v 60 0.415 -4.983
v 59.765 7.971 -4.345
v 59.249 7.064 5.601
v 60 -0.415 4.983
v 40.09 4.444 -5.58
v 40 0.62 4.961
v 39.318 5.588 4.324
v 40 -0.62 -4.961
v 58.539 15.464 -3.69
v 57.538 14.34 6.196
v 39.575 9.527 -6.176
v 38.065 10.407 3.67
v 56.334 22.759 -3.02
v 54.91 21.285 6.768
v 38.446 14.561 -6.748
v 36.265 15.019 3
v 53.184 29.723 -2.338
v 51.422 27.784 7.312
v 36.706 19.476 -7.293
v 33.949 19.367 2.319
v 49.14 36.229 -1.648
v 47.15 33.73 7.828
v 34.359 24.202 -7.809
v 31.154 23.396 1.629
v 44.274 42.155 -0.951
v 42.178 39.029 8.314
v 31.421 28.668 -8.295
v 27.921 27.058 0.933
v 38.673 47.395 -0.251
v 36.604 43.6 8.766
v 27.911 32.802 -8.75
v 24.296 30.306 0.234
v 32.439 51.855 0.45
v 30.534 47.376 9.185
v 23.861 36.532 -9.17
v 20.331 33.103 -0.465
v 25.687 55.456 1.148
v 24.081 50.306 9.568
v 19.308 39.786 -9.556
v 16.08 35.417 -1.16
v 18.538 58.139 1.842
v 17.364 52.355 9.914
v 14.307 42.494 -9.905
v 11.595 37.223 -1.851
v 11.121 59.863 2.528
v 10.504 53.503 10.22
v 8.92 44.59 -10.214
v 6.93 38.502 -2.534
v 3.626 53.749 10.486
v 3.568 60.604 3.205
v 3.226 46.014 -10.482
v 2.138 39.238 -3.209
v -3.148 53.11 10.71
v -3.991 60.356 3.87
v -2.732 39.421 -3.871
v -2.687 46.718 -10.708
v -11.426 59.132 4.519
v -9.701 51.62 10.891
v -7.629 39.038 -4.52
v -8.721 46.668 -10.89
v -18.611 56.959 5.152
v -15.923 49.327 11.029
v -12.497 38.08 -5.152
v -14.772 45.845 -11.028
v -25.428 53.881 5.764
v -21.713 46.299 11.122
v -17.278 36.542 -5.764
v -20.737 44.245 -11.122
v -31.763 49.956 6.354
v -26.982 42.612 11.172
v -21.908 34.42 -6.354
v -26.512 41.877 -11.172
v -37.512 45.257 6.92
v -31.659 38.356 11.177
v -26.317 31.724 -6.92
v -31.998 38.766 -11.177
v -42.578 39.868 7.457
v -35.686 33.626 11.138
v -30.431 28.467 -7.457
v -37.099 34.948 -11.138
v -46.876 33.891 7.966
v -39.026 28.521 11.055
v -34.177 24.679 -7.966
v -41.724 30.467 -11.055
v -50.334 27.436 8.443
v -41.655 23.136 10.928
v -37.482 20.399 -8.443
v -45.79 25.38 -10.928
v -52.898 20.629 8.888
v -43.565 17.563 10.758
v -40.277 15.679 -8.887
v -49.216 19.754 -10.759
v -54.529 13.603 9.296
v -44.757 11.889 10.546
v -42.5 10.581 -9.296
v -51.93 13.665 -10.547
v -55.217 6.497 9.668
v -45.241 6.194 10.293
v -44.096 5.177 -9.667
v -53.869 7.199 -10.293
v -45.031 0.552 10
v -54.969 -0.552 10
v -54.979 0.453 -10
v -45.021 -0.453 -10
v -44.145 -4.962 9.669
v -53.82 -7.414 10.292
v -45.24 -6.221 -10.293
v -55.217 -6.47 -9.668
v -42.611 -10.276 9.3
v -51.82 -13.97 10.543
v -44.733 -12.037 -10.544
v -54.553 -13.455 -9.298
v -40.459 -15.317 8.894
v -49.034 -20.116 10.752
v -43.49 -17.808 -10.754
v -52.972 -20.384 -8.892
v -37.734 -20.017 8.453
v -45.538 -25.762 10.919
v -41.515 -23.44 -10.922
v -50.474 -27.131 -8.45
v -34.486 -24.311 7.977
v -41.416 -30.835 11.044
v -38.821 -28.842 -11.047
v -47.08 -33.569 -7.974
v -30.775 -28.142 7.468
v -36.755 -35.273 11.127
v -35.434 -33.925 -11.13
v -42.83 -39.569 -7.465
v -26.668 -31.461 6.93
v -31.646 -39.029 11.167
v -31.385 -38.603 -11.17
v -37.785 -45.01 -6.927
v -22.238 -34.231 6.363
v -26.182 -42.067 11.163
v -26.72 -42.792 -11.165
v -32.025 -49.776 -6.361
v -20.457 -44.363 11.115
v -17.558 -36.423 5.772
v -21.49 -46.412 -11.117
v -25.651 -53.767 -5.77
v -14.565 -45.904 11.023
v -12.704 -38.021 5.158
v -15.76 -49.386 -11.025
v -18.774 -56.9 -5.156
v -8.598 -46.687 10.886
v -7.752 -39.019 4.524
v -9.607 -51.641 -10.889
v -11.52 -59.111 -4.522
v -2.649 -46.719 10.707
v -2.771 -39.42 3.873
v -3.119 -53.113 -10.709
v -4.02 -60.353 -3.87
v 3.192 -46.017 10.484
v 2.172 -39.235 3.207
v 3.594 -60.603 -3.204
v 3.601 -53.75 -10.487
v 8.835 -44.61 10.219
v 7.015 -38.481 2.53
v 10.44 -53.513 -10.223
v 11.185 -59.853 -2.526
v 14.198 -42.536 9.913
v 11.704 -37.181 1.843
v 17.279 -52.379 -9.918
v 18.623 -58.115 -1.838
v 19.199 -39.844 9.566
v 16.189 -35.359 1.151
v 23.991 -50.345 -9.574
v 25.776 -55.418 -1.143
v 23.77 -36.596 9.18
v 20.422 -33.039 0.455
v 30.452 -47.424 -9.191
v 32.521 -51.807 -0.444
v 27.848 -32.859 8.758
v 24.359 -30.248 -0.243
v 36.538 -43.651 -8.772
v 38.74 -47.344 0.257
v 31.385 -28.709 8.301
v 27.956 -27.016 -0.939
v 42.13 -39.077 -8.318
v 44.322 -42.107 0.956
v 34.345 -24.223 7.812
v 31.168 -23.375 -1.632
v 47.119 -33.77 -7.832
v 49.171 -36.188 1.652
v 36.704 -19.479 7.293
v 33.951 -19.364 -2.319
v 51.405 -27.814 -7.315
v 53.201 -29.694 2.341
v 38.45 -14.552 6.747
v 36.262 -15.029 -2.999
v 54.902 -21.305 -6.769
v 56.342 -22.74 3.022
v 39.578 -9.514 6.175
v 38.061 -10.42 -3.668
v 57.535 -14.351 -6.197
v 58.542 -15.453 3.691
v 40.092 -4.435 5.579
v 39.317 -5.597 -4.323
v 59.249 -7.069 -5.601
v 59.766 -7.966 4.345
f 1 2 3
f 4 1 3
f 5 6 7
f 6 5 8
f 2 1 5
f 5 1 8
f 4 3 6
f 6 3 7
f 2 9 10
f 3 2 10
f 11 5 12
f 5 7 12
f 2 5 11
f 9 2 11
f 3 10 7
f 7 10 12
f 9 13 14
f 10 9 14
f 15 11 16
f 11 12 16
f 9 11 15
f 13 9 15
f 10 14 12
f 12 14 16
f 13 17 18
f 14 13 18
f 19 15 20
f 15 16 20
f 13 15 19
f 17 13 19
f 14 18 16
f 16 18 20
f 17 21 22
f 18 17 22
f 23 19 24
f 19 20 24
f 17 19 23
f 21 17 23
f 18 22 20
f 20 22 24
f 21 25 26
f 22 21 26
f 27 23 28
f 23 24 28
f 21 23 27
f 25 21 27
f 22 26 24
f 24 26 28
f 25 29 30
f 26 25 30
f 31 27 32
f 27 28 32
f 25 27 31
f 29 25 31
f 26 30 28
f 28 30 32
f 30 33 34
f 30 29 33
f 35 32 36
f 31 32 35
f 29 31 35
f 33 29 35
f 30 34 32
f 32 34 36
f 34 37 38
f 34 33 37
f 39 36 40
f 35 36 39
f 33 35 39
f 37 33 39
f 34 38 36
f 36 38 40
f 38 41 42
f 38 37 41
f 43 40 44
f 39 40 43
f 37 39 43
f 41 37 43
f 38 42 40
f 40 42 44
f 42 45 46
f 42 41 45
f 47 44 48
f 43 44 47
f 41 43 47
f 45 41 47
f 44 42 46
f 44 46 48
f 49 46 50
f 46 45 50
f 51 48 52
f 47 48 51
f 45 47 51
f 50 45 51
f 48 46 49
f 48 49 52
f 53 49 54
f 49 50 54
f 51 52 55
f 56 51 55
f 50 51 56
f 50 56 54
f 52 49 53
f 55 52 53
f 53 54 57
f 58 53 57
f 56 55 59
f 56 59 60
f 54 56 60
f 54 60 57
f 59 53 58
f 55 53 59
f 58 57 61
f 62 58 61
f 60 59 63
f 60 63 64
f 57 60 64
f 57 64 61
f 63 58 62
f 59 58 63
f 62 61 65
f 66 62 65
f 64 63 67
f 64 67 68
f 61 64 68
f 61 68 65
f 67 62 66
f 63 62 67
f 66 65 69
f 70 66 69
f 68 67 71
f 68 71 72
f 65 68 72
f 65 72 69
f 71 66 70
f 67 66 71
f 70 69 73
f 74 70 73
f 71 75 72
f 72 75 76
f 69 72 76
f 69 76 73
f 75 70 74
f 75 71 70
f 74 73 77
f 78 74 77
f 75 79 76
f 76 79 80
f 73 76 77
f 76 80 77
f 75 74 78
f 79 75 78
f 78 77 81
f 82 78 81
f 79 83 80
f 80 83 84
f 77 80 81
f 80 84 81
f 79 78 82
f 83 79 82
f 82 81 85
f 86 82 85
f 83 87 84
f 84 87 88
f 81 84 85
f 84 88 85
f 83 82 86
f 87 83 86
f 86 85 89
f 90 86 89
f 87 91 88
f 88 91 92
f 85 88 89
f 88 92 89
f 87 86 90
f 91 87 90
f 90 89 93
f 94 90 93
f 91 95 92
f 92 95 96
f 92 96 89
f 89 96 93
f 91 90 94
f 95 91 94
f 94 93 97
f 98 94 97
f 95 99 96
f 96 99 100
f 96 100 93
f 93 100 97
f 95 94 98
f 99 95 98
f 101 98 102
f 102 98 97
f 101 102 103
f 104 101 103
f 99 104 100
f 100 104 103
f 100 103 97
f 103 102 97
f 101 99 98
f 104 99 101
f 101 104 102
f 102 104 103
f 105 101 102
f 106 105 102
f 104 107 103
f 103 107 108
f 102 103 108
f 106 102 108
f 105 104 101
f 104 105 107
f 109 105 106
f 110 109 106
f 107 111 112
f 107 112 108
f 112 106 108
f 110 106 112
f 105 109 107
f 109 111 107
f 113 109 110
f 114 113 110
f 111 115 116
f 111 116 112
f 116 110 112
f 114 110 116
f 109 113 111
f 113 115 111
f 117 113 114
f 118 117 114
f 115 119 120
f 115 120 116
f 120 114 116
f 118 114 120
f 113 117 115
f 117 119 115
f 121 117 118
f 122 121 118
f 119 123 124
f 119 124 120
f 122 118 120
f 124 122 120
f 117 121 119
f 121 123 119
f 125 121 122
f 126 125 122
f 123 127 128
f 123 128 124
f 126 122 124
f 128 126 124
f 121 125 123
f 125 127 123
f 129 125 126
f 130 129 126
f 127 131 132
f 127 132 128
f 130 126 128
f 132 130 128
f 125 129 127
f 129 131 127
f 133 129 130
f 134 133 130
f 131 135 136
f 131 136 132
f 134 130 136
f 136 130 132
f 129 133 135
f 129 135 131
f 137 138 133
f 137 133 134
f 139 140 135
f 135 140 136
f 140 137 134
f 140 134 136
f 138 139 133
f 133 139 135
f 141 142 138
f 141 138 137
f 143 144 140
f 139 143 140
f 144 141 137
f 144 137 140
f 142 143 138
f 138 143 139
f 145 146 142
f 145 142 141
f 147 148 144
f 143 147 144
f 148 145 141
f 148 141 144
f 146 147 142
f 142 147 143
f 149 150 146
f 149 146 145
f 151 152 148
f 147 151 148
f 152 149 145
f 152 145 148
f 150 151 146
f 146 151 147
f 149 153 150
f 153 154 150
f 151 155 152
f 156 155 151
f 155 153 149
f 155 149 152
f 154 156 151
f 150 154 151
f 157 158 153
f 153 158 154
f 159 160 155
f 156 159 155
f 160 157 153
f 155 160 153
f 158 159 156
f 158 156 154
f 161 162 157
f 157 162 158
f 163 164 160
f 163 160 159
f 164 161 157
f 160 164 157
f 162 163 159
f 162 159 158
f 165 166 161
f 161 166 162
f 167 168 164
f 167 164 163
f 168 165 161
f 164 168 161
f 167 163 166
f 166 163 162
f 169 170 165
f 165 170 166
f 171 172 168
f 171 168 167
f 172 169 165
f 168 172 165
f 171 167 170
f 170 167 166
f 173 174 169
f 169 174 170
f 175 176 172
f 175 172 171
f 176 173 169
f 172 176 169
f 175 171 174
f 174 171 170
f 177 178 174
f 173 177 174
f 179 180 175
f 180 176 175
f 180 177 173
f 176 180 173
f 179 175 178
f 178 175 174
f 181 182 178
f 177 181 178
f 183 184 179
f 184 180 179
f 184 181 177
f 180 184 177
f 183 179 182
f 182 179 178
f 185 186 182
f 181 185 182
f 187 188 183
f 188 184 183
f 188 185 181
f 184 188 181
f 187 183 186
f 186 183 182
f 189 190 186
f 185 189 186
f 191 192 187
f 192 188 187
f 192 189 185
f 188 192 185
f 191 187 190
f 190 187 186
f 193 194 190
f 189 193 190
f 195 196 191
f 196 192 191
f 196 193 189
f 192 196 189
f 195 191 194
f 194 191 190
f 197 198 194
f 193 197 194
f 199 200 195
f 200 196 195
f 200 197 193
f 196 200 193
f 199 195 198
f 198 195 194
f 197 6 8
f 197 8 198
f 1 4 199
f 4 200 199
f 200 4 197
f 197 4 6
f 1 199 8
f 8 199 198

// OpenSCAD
// Number of divisions
ns = 50;

// of the shell (in your drawing/model units. e.g. mm)
Thickness= 10;

// measured at the mid-curve of the surface (in your drawing/model units. e.g. mm)
Diameter = 50;

// (in your drawing/model units. e.g. mm)
Width = 20;


/*
    Parametrized equations:
        x(u,v)=(1+v/2*cos(u/2))*cos(u)
        y(u,v)=(1+v/2*cos(u/2))*sin(u)
        z(u,v)=v/2*sin(u/2)
    with
        0<=u<2*PI
        -1<=v<=1
*/

Mobius();

module Mobius(){
    for (i=[1:ns])
    {
        ang1=360/ns*(i-1);
        ang2=360/ns*(i);
        v=Width/Diameter;
        PM=[pMb( v,ang1)+nMb( v,ang1)*Thickness/2,
            pMb(-v,ang1)+nMb(-v,ang1)*Thickness/2,
            pMb( v,ang2)+nMb( v,ang2)*Thickness/2,
            pMb(-v,ang2)+nMb(-v,ang2)*Thickness/2,
            pMb( v,ang1)-nMb( v,ang1)*Thickness/2,
            pMb(-v,ang1)-nMb(-v,ang1)*Thickness/2,
            pMb( v,ang2)-nMb( v,ang2)*Thickness/2,
            pMb(-v,ang2)-nMb(-v,ang2)*Thickness/2,
        ];
        polyhedron(points=PM,
        faces=[[0,1,5,4],[2,0,4,6],[3,2,6,7],[1,3,7,5],[0,2,3,1],[4,5,7,6]]);
    }
}

function pMb(v,ang)=[
        Diameter*(1+v/2*cos(ang/2))*cos(ang),
        Diameter*(1+v/2*cos(ang/2))*sin(ang),
        Diameter*v/2*sin(ang/2)
        ];
function puMb(v,ang)=[
        (-v/4*sin(ang/2))*cos(ang)-(1+v/2*cos(ang/2))*sin(ang),
        (-v/4*sin(ang/2))*cos(ang)+(1+v/2*cos(ang/2))*cos(ang),
        v/4*cos(ang/2)
        ];
function pvMb(v,ang)=[
        1/2*cos(ang/2)*cos(ang),
        1/2*cos(ang/2)*sin(ang),
        1/2*sin(ang/2)
        ];
function nMb(v,ang)=
        cross(puMb(v,ang),pvMb(v,ang))/norm(cross(puMb(v,ang),pvMb(v,ang)));
        
